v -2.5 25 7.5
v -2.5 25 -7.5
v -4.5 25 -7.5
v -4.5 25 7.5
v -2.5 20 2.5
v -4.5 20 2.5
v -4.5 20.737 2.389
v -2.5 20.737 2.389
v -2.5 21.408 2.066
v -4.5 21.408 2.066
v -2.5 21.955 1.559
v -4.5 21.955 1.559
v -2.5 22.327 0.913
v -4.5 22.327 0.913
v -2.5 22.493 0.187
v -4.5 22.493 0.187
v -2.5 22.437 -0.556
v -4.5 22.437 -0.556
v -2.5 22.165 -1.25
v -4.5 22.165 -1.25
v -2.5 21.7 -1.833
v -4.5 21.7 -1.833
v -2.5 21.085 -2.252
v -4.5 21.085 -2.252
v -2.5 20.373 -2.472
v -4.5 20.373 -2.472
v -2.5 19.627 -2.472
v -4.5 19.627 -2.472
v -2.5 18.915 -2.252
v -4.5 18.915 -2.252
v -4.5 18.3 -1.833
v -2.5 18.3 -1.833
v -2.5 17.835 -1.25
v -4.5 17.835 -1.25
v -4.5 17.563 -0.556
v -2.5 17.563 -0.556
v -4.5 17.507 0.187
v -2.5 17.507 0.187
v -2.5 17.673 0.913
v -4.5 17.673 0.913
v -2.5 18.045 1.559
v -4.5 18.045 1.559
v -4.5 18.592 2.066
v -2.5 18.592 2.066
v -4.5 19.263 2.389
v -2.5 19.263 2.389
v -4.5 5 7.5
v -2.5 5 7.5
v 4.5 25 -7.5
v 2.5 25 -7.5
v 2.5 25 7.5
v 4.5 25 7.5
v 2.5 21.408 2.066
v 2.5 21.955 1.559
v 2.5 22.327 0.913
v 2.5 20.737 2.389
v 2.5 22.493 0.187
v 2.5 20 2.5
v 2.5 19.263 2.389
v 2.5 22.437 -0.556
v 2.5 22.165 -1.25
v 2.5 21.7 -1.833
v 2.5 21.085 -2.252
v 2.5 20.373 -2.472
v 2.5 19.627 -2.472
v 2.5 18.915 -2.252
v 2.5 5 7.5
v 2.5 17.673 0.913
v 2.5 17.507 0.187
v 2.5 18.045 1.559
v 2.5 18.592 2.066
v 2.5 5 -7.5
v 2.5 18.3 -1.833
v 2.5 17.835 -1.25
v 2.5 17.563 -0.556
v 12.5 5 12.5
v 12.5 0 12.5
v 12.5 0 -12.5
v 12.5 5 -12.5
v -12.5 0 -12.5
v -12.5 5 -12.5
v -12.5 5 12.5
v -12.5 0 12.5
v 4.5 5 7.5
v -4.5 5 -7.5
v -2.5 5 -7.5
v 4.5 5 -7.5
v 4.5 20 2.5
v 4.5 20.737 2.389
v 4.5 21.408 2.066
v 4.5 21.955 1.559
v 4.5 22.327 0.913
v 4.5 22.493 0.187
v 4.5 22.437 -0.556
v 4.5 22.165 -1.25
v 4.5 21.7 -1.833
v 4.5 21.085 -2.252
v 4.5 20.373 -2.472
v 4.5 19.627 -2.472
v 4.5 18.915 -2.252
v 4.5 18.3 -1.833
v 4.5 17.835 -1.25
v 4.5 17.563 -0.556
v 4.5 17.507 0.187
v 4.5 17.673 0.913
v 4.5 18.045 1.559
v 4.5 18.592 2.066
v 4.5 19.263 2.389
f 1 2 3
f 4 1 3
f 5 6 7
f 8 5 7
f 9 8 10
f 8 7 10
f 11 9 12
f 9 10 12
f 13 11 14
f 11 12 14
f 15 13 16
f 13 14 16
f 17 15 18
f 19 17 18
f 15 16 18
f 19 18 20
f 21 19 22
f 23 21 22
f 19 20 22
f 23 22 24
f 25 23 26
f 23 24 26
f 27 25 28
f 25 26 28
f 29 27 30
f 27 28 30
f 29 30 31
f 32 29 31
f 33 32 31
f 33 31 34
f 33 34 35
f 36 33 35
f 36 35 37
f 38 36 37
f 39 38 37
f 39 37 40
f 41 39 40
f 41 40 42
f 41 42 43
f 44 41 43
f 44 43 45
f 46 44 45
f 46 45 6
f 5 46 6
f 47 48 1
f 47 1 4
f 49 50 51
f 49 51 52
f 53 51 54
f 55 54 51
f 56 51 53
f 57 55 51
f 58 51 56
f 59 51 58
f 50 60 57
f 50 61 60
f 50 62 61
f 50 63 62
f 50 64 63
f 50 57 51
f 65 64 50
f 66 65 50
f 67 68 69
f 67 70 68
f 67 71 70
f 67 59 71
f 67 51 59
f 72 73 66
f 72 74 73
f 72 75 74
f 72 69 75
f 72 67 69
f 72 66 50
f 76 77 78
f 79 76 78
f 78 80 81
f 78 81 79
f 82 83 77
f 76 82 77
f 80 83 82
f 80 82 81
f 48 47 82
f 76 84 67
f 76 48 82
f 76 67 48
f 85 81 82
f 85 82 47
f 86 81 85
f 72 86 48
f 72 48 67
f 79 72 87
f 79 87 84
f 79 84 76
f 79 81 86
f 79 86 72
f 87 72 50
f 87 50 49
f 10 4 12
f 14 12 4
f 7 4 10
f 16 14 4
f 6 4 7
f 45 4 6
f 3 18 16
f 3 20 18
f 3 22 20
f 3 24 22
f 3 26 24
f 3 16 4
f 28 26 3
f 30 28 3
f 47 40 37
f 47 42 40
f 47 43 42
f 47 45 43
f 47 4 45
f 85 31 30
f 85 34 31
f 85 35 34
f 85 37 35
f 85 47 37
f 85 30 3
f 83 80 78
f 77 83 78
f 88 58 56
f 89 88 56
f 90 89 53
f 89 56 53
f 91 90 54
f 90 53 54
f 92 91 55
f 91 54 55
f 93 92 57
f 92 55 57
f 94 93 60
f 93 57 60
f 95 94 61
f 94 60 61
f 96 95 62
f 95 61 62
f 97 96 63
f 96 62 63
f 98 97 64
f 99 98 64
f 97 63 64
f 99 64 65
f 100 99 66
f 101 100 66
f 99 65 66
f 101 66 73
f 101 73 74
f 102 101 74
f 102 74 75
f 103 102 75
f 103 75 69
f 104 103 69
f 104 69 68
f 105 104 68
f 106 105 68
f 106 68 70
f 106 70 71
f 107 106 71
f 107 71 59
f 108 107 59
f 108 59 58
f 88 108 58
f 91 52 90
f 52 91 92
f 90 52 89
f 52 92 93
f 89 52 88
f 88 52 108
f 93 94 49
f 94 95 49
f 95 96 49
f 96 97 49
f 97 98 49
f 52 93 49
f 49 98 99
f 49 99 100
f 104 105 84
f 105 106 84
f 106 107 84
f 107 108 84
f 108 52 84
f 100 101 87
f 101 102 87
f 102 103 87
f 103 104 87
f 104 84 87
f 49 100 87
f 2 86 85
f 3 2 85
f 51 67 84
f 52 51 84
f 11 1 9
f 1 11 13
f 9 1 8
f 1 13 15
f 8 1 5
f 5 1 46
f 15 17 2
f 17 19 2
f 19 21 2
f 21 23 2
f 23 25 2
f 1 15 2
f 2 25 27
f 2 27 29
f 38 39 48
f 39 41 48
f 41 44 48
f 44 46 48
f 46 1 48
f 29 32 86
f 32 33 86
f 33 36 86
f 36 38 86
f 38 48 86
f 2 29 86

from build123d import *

# Parameters (mm, degrees)
SKETCH1_W           = 25
SKETCH1_H           = 25
BOSS_EXTRUDE1_DEPTH = 5
SKETCH10_W          = 2
SKETCH10_H          = 15
BOSS_EXTRUDE3_DEPTH = 20
SKETCH13_R          = 2.5
CUT_EXTRUDE3_DEPTH  = 33.714675606


with BuildPart() as part:
    # Sketch1 → Boss-Extrude1 (new body)
    with BuildSketch(Plane(origin=(0, 0, 0), x_dir=(1, 0, 0), z_dir=(0, 1, 0))):
        Rectangle(SKETCH1_W, SKETCH1_H)
    extrude(amount=BOSS_EXTRUDE1_DEPTH)

    # Sketch10 → Boss-Extrude3 (add)
    with BuildSketch(Plane(origin=(0, 5, 0), x_dir=(1, 0, 0), z_dir=(0, 1, 0))):
        with Locations((3.5, 0)):
            Rectangle(SKETCH10_W, SKETCH10_H)
    extrude(amount=BOSS_EXTRUDE3_DEPTH)

    # Mirror1: part across plane


with BuildPart() as part_1:
    add(part.part)
    add(part.part.mirror(Plane(origin=(0, 0, 0), x_dir=(0, 0, 1), z_dir=(1, 0, 0))))

    # Sketch13 → Cut-Extrude3 (cut, through all)
    with BuildSketch(Plane.ZY.offset(4.5)):
        with Locations((0, 20)):
            Circle(SKETCH13_R)
    extrude(amount=-CUT_EXTRUDE3_DEPTH, mode=Mode.SUBTRACT)


solid = part_1.part
